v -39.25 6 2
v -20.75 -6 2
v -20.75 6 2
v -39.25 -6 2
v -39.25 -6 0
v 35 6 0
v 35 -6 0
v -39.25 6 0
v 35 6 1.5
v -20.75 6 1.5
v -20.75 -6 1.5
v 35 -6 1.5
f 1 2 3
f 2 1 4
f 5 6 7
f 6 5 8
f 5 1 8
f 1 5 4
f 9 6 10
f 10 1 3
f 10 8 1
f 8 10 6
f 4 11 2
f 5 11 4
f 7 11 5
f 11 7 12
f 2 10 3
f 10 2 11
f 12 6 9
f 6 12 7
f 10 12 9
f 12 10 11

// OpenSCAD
// 10-well agarose gel comb, printed lying flat
// Units: mm

// ---- Plate ----
plate_t = 1.5;      // plate thickness (Z)

// ---- Spine ----
spine_len = 70;     // spine length (X)
spine_w   = 12;     // spine width (Y)

// ---- Teeth ----
n_teeth     = 10;   // number of teeth
tooth_w     = 5.0;  // tooth width (X)
tooth_len   = 12;   // tooth length (Y)
tooth_pitch = 1.5;  // gap between neighbouring teeth (X)
overhang    = 0.5;  // tooth extension past spine top face

// ---- Derived ----
total_len   = spine_len + (n_teeth - 1) * tooth_pitch;  // 70 + 9*1.5 = 83.5
x_start     = -spine_len / 2;

$fn = 64;

union() {
    // Spine
    translate([x_start, -spine_w / 2, 0])
        cube([spine_len, spine_w, plate_t]);

    // Teeth
    for (i = [0 : n_teeth - 1]) {
        translate([x_start + i * tooth_pitch + tooth_w / 2 - (n_teeth - 1) * tooth_pitch / 2,
                   -tooth_len / 2, 0])
            cube([tooth_w, tooth_len, plate_t + overhang]);
    }
}
